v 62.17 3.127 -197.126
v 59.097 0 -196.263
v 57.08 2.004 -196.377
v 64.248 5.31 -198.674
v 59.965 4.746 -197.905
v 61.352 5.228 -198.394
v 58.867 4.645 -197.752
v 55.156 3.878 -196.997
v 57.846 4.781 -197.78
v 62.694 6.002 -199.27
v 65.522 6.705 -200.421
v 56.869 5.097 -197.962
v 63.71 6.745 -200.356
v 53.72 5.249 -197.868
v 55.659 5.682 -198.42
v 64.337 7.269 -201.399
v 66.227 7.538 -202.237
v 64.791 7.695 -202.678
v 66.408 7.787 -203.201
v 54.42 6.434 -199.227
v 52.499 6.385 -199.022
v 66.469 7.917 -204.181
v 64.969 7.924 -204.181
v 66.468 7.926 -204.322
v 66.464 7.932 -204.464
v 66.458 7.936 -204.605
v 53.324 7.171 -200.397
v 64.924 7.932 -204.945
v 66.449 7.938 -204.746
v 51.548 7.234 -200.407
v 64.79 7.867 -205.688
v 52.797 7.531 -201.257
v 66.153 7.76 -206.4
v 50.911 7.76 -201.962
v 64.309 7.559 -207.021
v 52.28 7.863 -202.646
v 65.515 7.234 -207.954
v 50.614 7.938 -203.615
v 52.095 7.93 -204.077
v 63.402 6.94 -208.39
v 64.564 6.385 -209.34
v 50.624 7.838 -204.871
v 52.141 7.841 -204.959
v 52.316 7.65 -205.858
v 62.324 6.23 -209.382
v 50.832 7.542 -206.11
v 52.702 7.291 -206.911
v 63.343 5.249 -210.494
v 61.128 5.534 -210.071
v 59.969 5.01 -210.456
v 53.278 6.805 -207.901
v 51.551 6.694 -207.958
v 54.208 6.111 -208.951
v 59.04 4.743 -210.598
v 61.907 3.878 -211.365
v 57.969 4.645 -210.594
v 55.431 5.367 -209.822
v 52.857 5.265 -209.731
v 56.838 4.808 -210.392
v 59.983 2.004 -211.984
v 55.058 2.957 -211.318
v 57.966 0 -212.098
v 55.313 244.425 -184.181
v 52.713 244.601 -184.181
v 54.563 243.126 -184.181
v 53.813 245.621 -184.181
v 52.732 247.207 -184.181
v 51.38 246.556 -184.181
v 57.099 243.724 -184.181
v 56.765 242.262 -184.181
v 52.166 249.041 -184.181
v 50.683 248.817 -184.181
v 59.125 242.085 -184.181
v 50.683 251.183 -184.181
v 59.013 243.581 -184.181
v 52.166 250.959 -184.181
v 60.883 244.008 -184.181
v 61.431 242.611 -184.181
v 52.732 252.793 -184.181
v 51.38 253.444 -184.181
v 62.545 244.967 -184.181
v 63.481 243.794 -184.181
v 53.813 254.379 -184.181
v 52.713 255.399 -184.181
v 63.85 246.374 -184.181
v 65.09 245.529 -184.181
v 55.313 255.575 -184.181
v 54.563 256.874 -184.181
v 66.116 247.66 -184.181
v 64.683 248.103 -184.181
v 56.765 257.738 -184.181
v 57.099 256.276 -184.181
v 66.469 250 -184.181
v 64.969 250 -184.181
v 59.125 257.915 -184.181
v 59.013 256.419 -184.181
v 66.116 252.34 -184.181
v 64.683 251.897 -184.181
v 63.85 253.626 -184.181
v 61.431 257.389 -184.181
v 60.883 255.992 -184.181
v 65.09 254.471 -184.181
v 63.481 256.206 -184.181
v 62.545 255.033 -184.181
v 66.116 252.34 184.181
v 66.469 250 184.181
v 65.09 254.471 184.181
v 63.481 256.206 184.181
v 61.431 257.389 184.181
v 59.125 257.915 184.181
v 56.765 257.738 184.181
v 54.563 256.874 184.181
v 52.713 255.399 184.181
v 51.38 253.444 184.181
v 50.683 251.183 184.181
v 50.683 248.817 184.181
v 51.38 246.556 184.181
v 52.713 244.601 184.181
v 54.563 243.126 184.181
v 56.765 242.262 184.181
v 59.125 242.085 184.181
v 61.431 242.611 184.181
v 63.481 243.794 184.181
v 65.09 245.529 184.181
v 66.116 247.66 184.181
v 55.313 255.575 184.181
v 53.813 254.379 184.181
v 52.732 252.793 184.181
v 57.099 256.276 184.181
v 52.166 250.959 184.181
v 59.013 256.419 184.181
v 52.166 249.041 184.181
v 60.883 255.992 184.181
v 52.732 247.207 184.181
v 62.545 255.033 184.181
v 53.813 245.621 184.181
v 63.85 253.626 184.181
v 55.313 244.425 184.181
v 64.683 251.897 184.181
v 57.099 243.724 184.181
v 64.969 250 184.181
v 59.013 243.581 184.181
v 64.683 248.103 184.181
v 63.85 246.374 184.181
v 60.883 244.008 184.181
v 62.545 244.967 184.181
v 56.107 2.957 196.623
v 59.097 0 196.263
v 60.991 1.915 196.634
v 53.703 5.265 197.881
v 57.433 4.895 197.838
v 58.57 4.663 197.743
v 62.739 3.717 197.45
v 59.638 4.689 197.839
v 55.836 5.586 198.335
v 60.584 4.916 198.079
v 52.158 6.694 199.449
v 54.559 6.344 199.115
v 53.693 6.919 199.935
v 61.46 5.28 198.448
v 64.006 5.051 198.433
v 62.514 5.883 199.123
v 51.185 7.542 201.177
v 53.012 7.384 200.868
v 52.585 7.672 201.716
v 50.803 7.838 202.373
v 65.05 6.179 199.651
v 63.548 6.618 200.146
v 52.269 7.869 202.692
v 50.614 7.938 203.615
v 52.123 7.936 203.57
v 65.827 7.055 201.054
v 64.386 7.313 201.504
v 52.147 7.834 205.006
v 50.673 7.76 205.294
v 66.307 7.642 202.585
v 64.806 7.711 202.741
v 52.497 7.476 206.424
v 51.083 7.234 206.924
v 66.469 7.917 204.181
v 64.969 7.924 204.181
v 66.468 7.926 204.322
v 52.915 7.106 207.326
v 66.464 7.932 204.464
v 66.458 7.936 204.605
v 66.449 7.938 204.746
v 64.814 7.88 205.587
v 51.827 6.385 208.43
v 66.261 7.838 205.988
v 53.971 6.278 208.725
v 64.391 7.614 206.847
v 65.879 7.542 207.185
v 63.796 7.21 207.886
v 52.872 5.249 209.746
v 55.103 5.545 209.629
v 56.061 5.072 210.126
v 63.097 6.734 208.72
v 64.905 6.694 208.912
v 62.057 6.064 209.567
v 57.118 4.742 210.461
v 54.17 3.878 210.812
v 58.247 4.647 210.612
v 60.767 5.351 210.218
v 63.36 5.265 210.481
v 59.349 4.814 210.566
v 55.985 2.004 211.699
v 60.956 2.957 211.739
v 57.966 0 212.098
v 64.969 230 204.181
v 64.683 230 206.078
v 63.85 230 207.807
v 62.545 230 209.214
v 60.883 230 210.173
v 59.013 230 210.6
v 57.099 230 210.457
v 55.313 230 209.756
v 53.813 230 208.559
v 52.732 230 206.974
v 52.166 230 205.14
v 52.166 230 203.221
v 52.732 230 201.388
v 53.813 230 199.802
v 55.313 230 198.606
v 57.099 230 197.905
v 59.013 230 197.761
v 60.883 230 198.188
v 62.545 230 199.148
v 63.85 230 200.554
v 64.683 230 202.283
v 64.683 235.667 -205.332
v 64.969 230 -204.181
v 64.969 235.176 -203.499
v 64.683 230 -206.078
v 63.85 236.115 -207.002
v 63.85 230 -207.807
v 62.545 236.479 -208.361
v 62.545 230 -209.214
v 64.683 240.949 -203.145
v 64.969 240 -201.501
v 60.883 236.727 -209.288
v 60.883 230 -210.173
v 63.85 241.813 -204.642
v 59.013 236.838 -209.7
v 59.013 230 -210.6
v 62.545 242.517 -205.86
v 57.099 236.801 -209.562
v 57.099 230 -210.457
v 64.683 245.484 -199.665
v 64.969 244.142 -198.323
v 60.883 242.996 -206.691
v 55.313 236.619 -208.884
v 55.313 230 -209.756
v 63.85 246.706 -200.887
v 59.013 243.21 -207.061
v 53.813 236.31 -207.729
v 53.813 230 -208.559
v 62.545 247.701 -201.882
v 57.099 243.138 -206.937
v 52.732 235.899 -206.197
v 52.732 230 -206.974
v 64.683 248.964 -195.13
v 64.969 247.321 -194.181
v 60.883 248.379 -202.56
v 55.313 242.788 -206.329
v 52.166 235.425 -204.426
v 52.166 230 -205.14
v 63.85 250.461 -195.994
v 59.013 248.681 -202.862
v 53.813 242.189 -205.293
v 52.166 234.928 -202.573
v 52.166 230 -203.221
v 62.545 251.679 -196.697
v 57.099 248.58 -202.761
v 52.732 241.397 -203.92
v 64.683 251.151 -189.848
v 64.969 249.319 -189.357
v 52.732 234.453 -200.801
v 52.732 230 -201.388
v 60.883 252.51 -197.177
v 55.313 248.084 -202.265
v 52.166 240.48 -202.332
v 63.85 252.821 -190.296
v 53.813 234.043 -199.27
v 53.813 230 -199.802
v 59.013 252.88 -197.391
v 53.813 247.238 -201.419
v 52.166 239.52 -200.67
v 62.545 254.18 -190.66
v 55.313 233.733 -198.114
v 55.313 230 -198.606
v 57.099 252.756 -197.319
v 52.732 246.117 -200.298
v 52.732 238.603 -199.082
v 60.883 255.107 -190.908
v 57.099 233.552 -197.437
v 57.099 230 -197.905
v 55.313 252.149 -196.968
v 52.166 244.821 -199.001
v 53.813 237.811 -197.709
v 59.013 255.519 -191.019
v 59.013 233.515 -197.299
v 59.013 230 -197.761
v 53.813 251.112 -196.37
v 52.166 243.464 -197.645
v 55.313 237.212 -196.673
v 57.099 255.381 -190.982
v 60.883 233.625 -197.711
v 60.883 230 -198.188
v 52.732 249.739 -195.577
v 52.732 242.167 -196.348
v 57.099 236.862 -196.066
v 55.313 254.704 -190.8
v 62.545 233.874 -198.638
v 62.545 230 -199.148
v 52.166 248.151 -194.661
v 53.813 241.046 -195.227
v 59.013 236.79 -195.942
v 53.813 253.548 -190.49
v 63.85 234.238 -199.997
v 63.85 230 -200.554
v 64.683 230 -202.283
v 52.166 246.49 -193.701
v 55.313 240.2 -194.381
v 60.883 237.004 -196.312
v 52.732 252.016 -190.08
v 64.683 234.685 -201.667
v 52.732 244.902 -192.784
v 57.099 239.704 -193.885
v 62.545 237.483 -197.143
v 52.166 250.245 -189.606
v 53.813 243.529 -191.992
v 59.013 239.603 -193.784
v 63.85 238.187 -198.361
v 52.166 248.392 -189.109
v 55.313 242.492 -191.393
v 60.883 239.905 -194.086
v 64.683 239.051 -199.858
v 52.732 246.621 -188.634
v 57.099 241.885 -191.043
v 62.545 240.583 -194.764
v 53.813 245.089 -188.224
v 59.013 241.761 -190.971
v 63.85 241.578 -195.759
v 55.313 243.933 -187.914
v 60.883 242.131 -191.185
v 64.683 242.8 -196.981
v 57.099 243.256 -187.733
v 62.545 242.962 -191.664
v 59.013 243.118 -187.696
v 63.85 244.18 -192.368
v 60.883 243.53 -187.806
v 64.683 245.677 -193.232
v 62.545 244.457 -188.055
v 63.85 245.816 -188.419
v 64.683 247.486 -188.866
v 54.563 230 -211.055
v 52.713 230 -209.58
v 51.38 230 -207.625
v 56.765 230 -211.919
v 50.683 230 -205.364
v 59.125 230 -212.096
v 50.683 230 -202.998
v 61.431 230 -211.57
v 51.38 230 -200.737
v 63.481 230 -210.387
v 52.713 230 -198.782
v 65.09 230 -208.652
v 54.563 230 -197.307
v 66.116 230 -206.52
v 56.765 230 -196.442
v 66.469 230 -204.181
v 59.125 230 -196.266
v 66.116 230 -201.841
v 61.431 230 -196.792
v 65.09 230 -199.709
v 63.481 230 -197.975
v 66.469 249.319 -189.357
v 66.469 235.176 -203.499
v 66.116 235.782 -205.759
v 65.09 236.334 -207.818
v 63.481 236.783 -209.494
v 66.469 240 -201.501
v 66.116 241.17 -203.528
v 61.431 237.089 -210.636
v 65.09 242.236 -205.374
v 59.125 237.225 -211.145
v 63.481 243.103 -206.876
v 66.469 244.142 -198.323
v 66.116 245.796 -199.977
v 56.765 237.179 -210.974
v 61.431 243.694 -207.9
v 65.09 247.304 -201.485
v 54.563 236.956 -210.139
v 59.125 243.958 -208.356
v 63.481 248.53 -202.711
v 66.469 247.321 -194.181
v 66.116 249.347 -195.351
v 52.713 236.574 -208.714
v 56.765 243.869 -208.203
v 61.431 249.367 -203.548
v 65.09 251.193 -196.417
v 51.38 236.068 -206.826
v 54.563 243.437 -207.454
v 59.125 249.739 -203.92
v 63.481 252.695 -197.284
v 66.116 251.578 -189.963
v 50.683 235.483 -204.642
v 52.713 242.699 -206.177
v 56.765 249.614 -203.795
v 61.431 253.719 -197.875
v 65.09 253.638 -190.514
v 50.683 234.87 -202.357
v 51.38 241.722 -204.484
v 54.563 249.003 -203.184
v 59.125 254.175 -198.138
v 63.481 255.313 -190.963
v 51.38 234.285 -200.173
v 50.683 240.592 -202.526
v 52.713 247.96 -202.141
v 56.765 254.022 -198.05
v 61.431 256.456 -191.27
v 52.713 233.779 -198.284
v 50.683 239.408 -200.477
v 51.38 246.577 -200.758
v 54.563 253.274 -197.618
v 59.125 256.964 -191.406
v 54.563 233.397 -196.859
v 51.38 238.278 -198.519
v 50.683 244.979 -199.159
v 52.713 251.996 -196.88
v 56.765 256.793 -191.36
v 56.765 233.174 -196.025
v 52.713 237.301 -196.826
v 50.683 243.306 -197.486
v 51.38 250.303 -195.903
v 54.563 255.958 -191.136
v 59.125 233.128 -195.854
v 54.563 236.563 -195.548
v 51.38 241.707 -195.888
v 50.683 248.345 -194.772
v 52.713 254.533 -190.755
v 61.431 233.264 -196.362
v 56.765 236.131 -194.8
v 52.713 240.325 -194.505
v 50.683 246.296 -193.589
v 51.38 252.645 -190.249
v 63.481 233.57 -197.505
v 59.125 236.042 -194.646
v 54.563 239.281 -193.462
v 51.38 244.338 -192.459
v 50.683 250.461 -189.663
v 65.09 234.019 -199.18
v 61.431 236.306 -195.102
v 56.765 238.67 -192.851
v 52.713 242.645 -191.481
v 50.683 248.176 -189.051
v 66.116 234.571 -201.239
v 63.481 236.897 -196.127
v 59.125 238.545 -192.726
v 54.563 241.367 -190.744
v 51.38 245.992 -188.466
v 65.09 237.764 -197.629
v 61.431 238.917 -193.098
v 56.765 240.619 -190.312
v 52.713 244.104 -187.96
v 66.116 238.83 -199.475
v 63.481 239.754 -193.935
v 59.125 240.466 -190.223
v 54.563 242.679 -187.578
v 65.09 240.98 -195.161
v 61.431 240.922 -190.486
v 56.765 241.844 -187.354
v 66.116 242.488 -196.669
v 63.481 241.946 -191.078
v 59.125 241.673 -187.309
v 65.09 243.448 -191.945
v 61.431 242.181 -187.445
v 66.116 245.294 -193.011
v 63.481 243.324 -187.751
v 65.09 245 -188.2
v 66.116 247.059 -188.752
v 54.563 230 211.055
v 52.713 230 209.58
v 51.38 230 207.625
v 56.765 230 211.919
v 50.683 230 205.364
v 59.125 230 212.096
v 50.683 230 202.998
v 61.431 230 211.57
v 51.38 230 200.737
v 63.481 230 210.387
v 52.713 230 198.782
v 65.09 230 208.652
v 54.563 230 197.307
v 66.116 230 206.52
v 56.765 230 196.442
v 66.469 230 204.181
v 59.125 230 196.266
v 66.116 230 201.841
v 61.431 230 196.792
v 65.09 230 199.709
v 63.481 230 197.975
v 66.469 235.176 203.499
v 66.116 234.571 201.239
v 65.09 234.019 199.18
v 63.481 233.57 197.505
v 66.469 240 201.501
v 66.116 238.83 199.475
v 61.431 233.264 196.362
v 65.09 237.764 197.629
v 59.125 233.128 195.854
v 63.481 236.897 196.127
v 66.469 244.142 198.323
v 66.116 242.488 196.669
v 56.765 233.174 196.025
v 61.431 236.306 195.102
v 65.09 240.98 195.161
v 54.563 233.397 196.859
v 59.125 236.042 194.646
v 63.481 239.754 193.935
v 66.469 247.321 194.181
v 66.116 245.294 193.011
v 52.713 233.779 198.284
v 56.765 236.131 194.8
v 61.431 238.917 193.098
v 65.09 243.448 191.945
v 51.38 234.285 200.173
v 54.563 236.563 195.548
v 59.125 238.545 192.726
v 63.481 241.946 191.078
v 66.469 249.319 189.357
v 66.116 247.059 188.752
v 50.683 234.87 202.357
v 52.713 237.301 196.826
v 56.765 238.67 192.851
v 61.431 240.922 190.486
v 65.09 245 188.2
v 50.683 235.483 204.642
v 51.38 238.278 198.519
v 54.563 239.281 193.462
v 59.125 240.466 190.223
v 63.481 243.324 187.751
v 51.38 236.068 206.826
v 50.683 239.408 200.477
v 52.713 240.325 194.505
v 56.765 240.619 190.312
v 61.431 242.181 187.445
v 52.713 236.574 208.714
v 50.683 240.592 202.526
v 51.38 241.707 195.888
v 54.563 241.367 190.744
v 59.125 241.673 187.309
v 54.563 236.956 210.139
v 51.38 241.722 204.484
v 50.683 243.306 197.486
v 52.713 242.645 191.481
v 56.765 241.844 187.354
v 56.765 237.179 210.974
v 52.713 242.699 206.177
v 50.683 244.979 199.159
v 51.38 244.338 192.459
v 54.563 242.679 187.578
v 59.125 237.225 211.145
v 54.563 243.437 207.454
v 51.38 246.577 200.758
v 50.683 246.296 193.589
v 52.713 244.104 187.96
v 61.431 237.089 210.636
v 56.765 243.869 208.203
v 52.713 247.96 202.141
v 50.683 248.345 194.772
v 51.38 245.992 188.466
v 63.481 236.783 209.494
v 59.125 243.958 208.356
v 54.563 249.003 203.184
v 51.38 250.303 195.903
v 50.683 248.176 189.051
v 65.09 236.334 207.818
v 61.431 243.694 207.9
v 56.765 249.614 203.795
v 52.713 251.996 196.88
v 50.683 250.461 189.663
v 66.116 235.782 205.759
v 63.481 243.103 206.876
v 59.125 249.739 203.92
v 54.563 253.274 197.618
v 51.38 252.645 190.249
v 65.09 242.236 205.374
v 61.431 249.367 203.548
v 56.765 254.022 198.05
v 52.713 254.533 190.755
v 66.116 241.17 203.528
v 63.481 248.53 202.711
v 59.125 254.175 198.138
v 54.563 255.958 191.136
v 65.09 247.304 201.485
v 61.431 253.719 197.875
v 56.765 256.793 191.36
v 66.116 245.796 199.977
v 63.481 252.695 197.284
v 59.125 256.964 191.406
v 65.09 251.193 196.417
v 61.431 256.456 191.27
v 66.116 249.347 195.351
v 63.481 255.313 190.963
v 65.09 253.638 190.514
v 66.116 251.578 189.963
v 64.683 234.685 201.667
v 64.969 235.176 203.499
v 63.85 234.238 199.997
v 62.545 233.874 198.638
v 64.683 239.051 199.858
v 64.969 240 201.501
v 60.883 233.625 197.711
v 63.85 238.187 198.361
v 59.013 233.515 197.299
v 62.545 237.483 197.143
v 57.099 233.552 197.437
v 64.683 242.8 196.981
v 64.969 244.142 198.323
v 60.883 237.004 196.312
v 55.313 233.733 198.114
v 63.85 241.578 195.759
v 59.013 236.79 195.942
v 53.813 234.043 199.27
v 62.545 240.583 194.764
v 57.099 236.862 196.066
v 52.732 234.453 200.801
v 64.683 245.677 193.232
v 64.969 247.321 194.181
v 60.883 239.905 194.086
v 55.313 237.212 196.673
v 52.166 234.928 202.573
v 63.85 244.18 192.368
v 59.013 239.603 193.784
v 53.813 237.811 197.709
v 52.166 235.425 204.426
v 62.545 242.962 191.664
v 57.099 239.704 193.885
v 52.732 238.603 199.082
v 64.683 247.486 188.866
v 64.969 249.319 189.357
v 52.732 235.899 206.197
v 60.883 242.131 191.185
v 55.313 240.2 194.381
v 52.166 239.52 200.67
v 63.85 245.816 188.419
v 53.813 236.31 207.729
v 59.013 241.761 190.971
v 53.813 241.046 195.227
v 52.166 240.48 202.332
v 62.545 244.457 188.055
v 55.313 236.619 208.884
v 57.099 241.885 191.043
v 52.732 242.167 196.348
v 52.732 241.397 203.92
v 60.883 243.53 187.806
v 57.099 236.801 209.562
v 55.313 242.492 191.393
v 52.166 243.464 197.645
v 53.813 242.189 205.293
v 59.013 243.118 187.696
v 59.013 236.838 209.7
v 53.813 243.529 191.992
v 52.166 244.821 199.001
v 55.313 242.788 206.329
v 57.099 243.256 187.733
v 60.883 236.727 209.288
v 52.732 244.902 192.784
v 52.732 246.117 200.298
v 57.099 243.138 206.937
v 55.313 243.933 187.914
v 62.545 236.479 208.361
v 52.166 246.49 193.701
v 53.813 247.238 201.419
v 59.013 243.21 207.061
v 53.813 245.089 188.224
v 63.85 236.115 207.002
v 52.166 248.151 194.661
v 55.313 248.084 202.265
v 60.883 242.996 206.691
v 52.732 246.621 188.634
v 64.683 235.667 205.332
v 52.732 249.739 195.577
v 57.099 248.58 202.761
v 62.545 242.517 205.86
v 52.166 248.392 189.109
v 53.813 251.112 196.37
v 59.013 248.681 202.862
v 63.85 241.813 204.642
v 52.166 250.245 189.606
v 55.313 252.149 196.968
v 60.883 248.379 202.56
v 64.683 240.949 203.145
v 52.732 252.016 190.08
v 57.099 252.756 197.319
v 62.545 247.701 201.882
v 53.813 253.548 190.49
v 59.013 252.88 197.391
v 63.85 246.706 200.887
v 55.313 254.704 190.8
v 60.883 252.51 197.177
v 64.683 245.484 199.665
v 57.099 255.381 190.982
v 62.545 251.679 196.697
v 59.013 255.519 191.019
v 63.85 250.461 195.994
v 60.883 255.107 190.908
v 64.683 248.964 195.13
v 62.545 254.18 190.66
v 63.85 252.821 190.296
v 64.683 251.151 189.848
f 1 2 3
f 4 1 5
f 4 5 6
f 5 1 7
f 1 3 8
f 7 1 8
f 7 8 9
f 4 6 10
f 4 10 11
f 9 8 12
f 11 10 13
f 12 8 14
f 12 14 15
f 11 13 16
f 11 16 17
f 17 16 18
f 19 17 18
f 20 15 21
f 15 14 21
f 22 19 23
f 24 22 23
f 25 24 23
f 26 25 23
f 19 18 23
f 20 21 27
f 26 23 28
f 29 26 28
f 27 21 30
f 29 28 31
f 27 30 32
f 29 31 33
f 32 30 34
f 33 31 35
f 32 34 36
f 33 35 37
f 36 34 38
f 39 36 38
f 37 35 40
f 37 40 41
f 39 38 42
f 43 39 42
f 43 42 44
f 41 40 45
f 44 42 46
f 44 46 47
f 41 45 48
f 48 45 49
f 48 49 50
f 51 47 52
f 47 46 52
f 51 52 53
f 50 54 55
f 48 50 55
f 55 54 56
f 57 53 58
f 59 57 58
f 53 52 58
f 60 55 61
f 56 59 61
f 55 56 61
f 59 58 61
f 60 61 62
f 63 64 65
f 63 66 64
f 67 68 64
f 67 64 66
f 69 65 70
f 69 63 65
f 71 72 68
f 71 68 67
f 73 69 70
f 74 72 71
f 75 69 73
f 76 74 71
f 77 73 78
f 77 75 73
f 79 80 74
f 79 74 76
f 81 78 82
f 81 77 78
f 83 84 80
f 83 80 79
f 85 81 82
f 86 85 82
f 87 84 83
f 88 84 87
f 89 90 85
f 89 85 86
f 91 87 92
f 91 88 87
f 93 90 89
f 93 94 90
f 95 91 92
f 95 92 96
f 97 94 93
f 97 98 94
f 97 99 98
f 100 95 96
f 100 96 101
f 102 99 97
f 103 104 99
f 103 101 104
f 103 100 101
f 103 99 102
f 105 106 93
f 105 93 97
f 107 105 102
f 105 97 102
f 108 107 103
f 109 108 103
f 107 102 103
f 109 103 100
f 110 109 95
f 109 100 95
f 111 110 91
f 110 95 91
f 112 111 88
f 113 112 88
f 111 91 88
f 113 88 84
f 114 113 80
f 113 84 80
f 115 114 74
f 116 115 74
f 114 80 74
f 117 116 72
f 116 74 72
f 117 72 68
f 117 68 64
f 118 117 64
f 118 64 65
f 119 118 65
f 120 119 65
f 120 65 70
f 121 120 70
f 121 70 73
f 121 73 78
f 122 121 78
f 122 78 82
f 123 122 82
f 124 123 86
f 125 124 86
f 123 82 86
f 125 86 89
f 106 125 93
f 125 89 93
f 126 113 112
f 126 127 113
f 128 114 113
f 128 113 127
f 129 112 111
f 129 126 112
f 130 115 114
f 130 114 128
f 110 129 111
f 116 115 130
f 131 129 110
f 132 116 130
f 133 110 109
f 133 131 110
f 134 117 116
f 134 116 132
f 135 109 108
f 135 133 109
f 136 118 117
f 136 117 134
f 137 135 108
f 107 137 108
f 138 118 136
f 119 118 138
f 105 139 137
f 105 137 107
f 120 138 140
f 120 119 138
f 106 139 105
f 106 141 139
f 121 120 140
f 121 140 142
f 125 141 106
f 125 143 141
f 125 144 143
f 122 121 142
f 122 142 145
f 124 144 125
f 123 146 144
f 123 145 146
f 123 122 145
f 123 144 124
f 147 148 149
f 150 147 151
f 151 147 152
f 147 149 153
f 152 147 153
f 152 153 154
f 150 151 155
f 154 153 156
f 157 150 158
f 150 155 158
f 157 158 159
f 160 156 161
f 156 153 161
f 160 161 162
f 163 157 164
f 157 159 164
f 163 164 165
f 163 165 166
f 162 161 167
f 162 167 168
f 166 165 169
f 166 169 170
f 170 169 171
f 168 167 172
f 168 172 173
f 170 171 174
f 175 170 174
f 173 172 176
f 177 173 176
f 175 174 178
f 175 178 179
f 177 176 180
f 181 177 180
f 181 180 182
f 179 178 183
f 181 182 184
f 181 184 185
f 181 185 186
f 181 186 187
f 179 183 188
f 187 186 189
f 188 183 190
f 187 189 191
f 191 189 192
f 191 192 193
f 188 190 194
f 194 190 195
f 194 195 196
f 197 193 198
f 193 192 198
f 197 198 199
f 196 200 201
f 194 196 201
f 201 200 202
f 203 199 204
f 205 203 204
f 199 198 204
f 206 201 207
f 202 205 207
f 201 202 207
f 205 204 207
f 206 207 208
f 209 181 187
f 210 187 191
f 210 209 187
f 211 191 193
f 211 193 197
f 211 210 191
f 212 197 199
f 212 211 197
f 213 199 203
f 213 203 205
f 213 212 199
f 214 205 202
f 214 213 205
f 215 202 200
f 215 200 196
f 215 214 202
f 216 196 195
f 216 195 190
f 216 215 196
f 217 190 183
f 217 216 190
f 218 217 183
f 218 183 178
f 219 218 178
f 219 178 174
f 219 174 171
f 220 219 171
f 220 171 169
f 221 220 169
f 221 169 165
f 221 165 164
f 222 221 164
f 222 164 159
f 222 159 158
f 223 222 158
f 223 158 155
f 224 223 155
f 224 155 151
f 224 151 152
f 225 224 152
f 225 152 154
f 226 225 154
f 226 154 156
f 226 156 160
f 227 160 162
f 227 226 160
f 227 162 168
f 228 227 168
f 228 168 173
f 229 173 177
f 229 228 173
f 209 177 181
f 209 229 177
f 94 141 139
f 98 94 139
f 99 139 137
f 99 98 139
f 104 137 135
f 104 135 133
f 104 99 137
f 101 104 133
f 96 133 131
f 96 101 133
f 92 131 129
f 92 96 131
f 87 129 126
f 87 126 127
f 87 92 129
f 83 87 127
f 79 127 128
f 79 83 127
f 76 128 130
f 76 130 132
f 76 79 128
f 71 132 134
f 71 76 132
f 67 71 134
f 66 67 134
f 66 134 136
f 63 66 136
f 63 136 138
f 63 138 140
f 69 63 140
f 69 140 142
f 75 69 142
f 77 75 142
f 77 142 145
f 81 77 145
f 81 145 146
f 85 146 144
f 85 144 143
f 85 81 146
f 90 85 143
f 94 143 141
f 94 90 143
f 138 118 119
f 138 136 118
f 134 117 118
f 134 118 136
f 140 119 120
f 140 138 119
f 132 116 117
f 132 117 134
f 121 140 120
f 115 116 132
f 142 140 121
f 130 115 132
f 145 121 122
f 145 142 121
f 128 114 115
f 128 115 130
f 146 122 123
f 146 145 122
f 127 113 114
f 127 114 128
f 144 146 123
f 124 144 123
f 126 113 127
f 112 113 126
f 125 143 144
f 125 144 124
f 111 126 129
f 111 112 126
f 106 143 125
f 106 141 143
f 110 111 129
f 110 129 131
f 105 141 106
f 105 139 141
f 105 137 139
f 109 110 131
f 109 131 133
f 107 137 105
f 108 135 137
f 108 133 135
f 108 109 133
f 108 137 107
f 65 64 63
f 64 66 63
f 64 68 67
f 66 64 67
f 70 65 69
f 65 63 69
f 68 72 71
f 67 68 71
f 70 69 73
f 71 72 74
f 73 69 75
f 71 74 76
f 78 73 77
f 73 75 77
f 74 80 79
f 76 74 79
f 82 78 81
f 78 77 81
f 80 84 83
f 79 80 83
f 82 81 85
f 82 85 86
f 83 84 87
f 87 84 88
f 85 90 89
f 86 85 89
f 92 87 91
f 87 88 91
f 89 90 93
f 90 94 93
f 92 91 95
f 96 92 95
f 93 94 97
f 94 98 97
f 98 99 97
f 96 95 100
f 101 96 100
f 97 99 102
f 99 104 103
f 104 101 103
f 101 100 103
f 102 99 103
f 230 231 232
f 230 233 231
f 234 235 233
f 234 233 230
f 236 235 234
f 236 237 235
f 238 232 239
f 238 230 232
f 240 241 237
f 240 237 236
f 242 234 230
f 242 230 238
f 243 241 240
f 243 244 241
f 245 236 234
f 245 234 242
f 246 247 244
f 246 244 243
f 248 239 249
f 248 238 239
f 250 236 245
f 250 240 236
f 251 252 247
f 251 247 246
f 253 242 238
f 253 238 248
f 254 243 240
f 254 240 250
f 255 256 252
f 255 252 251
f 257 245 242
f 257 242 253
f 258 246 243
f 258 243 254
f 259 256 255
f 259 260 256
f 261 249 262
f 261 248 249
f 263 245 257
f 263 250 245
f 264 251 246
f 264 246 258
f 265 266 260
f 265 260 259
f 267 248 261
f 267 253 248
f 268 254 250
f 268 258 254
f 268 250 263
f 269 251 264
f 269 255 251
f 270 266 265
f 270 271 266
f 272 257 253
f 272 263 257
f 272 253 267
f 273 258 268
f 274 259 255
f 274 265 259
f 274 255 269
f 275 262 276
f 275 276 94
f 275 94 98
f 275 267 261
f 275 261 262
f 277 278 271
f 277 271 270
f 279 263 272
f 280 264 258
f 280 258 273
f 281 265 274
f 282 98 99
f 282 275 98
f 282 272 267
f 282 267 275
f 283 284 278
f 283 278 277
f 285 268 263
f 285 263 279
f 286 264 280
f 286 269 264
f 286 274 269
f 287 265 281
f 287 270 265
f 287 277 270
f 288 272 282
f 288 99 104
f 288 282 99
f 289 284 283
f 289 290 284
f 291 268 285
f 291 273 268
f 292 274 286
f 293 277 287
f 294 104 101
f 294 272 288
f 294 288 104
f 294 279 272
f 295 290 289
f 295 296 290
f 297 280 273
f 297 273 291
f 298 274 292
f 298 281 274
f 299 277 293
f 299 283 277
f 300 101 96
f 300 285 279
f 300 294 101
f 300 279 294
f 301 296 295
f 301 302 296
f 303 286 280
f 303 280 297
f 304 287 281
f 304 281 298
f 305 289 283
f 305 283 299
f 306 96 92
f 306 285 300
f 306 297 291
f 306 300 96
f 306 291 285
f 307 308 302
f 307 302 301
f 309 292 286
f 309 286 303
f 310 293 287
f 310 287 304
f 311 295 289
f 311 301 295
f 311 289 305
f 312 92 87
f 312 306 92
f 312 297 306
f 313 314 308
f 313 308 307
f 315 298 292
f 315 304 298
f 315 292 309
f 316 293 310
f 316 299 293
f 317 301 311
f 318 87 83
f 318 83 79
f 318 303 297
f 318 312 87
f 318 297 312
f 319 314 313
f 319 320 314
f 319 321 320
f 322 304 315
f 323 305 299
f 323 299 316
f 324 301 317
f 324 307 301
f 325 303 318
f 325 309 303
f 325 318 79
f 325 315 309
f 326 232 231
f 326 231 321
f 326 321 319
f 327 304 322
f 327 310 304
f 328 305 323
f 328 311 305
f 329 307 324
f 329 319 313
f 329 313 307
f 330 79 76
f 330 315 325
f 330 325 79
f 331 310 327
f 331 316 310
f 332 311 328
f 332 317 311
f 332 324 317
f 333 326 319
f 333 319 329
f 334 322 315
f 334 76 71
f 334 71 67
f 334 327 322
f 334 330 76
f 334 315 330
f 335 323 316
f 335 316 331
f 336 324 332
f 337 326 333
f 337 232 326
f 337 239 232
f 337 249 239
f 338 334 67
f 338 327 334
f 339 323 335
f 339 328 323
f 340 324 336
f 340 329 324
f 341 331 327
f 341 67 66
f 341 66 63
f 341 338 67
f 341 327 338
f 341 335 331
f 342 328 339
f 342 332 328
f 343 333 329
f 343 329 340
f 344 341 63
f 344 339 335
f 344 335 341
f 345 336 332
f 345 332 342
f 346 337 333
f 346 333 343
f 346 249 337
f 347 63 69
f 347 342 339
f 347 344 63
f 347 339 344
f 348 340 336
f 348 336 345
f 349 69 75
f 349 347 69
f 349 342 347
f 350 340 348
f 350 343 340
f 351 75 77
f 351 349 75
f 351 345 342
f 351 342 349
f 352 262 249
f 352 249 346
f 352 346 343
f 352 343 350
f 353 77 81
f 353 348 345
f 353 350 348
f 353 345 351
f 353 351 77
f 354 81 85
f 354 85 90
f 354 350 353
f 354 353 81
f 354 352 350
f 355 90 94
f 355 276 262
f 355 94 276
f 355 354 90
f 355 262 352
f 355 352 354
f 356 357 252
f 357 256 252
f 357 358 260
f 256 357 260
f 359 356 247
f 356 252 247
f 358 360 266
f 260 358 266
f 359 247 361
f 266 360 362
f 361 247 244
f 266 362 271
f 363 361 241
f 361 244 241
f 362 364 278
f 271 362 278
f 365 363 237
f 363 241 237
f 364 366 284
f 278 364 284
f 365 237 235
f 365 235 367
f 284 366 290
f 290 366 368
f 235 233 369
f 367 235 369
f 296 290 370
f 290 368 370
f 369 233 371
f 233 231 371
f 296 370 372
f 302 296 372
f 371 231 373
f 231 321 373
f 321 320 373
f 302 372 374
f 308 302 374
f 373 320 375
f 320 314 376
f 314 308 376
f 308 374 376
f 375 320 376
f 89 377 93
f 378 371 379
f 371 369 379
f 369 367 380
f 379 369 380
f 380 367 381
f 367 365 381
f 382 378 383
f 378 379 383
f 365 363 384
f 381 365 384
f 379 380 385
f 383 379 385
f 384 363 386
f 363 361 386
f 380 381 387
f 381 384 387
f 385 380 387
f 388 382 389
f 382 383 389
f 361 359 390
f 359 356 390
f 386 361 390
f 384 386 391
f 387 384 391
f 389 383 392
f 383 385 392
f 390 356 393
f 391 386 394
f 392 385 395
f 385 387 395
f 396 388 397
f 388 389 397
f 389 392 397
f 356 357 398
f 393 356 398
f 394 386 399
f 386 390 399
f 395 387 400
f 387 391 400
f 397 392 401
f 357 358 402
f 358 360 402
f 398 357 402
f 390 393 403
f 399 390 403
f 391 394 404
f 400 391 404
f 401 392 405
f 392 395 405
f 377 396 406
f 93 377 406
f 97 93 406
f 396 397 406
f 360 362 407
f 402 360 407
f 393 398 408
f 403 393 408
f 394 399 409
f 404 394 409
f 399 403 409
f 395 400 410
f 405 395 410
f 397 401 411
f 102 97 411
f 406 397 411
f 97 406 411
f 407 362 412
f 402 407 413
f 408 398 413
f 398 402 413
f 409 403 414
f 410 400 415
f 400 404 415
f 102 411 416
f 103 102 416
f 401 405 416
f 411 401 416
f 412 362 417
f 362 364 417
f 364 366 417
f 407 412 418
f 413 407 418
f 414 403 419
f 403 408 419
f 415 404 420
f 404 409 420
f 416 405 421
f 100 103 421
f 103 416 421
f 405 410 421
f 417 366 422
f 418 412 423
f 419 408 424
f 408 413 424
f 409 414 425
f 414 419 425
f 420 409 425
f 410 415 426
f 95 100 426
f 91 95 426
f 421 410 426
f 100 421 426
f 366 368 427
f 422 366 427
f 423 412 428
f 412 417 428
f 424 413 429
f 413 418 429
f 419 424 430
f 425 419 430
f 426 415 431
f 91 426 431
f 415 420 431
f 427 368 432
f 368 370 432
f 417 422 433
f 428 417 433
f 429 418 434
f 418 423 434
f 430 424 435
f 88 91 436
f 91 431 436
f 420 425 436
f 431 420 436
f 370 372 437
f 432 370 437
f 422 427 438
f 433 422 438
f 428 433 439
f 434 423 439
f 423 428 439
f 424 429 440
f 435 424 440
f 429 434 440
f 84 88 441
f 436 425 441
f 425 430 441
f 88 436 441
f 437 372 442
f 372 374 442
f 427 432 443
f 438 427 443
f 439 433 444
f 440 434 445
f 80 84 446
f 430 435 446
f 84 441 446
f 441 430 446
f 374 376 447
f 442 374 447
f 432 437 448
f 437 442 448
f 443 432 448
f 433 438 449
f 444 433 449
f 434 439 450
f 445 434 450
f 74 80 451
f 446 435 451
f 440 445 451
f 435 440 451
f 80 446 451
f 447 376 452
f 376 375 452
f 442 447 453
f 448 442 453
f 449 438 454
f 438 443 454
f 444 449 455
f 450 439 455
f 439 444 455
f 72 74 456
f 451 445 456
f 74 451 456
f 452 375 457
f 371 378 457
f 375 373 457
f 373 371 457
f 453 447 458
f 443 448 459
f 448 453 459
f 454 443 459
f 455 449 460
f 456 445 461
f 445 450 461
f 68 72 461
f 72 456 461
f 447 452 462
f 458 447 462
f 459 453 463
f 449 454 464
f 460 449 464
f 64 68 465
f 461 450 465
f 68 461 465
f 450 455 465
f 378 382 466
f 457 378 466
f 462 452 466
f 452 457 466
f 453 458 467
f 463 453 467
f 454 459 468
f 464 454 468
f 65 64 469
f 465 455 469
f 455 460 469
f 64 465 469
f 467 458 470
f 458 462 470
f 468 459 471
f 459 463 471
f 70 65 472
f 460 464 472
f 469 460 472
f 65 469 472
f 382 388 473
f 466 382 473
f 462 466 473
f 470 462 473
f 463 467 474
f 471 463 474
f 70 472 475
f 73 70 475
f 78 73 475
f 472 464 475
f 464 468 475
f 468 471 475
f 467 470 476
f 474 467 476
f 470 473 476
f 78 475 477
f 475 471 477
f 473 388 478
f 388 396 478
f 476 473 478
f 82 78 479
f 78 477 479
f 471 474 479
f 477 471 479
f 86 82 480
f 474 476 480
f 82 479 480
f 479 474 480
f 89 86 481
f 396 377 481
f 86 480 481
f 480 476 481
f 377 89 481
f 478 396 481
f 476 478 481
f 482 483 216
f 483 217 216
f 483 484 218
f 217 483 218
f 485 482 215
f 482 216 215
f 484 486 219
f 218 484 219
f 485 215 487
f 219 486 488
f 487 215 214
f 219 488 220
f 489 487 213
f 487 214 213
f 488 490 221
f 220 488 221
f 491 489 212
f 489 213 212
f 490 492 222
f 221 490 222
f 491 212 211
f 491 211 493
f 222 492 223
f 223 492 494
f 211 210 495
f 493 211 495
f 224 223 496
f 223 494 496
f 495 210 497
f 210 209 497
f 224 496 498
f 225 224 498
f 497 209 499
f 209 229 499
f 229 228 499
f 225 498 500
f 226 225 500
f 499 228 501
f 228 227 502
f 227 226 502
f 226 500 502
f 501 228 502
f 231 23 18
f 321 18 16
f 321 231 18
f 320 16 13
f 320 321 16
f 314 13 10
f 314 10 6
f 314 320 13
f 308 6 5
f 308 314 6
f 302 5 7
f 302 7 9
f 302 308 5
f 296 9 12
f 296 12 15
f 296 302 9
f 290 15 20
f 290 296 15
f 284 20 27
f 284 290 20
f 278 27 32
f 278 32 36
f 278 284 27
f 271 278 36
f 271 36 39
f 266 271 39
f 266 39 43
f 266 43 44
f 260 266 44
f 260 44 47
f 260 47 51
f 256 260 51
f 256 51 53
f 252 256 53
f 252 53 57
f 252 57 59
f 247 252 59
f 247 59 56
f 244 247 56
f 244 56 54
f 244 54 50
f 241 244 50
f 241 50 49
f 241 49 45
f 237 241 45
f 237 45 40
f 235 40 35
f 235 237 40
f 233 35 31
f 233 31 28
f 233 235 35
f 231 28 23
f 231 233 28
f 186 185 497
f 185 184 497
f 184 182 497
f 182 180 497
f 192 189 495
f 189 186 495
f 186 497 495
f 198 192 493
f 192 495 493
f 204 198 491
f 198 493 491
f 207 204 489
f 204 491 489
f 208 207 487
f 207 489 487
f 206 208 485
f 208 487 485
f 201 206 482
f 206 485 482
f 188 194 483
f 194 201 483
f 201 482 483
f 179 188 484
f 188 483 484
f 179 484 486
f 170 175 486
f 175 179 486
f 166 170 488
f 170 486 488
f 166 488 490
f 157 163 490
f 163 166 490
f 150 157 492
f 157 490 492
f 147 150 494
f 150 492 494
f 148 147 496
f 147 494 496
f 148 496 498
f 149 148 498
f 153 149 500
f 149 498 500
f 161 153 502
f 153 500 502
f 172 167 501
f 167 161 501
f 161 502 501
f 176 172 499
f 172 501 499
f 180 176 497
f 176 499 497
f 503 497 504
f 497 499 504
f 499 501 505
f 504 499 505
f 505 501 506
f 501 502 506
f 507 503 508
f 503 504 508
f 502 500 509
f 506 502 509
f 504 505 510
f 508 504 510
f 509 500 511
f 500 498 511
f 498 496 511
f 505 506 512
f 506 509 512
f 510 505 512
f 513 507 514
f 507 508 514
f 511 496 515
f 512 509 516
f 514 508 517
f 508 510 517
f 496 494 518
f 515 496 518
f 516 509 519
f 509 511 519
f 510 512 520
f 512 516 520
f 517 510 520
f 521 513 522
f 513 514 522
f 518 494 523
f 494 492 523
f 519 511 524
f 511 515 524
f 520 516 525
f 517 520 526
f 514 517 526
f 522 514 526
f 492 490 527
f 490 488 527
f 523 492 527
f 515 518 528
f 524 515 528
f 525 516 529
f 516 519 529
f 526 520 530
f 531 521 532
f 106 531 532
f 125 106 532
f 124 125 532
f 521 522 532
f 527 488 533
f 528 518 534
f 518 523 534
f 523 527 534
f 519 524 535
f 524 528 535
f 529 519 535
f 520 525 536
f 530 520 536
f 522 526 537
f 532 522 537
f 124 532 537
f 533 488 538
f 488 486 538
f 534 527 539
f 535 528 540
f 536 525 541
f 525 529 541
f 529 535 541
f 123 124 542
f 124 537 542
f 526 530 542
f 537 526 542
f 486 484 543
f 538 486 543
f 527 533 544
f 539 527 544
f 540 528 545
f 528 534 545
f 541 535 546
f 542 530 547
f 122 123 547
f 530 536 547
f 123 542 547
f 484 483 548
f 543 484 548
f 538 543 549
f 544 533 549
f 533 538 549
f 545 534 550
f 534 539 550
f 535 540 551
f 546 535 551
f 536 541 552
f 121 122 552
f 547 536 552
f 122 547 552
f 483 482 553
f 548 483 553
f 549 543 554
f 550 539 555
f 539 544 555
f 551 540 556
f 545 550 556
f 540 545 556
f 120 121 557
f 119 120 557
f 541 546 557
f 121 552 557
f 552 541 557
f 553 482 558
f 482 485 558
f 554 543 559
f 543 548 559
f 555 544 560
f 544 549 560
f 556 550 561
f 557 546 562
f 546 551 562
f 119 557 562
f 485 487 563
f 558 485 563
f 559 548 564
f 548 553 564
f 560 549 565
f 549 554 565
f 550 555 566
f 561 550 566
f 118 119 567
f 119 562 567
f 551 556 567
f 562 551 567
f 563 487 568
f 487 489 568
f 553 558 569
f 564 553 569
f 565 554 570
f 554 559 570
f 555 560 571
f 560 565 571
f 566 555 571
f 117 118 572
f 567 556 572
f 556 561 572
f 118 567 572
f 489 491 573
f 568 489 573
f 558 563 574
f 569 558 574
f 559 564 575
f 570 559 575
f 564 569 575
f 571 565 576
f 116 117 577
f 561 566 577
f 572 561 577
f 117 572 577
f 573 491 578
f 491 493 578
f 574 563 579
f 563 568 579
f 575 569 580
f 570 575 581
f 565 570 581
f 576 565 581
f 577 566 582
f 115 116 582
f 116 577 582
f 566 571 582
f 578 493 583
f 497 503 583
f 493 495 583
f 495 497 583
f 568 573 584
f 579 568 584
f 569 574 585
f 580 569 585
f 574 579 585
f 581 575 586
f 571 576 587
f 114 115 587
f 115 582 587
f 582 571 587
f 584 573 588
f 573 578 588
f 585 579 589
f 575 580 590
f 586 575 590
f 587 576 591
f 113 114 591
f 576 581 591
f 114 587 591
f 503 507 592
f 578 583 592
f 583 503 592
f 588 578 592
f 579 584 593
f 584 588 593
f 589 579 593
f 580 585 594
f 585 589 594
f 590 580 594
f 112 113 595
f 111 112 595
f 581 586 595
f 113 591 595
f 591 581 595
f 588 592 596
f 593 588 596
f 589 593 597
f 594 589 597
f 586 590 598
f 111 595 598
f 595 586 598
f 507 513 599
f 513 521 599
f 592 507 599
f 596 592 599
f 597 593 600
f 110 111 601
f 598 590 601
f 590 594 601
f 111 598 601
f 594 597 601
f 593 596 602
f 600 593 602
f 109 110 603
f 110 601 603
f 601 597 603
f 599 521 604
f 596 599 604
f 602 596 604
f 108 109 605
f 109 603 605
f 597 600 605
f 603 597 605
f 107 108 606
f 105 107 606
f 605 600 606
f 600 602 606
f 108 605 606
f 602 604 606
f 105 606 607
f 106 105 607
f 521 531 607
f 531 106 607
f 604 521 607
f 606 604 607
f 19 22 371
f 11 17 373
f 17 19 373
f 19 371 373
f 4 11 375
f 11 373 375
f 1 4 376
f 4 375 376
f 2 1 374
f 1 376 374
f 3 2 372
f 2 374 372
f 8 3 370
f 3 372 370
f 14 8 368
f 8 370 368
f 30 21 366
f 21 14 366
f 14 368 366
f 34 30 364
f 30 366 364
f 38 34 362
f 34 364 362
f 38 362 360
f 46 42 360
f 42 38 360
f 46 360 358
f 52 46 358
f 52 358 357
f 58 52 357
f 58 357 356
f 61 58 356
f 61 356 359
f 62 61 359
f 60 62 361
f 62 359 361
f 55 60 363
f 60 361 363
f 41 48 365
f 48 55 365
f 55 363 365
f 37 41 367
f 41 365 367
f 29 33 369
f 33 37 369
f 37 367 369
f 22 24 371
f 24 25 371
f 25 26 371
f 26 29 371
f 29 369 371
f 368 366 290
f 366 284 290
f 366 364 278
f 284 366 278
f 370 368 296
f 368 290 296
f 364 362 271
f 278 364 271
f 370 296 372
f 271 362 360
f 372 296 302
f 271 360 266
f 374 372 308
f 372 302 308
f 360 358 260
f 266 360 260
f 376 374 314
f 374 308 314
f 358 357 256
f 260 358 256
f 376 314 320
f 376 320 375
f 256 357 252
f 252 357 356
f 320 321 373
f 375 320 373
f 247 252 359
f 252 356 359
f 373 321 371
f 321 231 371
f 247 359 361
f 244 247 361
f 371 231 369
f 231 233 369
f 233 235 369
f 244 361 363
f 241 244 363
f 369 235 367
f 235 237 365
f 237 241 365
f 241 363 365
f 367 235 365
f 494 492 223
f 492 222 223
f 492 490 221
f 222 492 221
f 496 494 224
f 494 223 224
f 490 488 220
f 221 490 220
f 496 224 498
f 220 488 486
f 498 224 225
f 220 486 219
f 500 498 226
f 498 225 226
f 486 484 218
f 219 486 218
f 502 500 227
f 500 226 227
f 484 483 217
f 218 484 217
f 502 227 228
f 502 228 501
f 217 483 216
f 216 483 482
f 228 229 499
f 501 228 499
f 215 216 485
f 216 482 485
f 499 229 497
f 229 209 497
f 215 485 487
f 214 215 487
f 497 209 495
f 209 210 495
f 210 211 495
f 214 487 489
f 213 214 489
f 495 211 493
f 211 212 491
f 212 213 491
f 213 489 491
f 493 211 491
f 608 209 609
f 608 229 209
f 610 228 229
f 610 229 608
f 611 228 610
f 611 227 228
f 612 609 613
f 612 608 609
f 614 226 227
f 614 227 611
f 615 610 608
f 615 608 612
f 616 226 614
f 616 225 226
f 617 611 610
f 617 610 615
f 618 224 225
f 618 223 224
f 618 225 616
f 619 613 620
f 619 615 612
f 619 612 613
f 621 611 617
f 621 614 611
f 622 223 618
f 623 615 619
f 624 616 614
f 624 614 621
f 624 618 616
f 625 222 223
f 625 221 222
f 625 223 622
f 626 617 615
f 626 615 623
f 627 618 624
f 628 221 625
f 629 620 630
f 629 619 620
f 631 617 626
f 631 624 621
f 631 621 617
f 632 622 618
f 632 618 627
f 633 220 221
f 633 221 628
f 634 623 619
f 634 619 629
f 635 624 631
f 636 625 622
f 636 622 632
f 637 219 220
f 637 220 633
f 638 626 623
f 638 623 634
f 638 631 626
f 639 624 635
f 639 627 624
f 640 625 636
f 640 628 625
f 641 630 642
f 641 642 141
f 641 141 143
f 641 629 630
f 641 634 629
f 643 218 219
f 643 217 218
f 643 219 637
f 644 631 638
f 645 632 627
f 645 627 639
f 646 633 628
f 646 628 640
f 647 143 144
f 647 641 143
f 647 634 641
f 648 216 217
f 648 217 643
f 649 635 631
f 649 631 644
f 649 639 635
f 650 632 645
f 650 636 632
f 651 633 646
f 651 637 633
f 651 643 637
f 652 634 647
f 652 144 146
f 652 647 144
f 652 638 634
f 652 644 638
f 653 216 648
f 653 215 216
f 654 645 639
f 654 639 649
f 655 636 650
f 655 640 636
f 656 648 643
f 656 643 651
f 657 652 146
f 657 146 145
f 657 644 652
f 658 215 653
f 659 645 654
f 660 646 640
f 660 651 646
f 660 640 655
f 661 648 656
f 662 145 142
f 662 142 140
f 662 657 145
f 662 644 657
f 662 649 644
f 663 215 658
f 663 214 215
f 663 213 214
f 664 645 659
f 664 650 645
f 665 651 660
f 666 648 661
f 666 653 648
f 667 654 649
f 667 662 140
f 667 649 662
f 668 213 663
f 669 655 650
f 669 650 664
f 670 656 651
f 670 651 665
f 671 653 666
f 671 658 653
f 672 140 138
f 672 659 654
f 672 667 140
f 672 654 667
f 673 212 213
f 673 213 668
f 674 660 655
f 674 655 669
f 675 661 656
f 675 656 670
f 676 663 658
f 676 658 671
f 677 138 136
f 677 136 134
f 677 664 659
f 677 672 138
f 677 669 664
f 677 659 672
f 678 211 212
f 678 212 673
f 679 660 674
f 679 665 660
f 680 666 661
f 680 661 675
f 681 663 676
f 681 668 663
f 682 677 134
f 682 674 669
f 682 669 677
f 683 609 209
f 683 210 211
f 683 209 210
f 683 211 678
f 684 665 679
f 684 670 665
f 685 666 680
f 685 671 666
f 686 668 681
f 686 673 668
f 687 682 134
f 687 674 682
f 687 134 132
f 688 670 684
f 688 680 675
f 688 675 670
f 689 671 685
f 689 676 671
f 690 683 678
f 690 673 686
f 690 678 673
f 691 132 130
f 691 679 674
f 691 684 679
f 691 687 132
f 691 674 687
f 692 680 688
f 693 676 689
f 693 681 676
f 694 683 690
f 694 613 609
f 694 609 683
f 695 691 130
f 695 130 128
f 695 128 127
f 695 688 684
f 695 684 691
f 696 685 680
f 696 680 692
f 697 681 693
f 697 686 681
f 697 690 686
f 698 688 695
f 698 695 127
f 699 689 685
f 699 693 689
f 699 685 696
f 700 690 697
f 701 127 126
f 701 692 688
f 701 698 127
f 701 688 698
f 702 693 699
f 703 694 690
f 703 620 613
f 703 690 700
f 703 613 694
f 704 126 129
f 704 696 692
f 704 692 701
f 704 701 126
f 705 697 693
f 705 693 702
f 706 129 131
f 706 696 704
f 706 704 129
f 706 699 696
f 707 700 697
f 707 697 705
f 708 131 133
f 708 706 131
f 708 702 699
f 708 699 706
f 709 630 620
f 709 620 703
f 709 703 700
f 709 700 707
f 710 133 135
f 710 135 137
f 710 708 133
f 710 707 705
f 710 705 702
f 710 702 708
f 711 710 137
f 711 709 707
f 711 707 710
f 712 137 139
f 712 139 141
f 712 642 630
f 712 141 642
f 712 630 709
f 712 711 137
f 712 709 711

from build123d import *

# Parameters (mm, degrees)
SKETCH1_ON_SEGMENT_1_R               = 7.9375
SKETCH1_ON_SEGMENT_1_R_2             = 6.4375
PIPE_CONFIGURED_21_3_X_2_3_1_DEPTH   = 230
SKETCH1_ON_SEGMENT_2_R               = 7.9375
SKETCH1_ON_SEGMENT_2_R_2             = 6.4375
PIPE_CONFIGURED_21_3_X_2_3_1_2_ANGLE = 90
SKETCH1_ON_SEGMENT_3_R               = 7.9375
SKETCH1_ON_SEGMENT_3_R_2             = 6.4375
PIPE_CONFIGURED_21_3_X_2_3_1_3_DEPTH = 368.361654036
SKETCH1_ON_SEGMENT_4_R               = 7.9375
SKETCH1_ON_SEGMENT_4_R_2             = 6.4375
PIPE_CONFIGURED_21_3_X_2_3_1_4_ANGLE = 90
SKETCH1_R                            = 7.9375
SKETCH1_R_2                          = 6.4375
PIPE_CONFIGURED_21_3_X_2_3_1_5_DEPTH = 230
ESBO_O6_R                            = 7.9375


with BuildPart() as part:
    # Sketch1 on segment 1 (carried to segment 1) → Pipe - configured 21.3 X 2.3(1) (new body)
    with BuildSketch(Plane(origin=(58.531578249, 230, -204.180827018), x_dir=(1, 0, 0), z_dir=(0, -1, 0))):
        Circle(SKETCH1_ON_SEGMENT_1_R)
        Circle(SKETCH1_ON_SEGMENT_1_R_2, mode=Mode.SUBTRACT)
    extrude(amount=PIPE_CONFIGURED_21_3_X_2_3_1_DEPTH)


with BuildPart() as body_2:
    # Sketch1 on segment 2 (carried to the start of arc 2) → Pipe - configured 21.3 X 2.3_1 2 (revolve)
    with BuildSketch(Plane(origin=(58.531578249, 230, -204.180827018), x_dir=(1, 0, 0), z_dir=(0, 1, 0))):
        Circle(SKETCH1_ON_SEGMENT_2_R)
        Circle(SKETCH1_ON_SEGMENT_2_R_2, mode=Mode.SUBTRACT)
    revolve(axis=Axis((58.531578249, 230, -184.180827018), (1, 0, 0)), revolution_arc=PIPE_CONFIGURED_21_3_X_2_3_1_2_ANGLE)


with BuildPart() as body_3:
    # Sketch1 on segment 3 (carried to segment 3) → Pipe - configured 21.3 X 2.3_1 3 (new body)
    with BuildSketch(Plane(origin=(58.531578249, 250, -184.180827018), x_dir=(1, 0, 0), z_dir=(0, 0, 1))):
        Circle(SKETCH1_ON_SEGMENT_3_R)
        Circle(SKETCH1_ON_SEGMENT_3_R_2, mode=Mode.SUBTRACT)
    extrude(amount=PIPE_CONFIGURED_21_3_X_2_3_1_3_DEPTH)


with BuildPart() as body_4:
    # Sketch1 on segment 4 (carried to the start of arc 4) → Pipe - configured 21.3 X 2.3_1 4 (revolve)
    with BuildSketch(Plane(origin=(58.531578249, 230, 204.180827018), x_dir=(1, 0, 0), z_dir=(0, 1, 0))):
        Circle(SKETCH1_ON_SEGMENT_4_R)
        Circle(SKETCH1_ON_SEGMENT_4_R_2, mode=Mode.SUBTRACT)
    revolve(axis=Axis((58.531578249, 230, 184.180827018), (-1, 0, 0)), revolution_arc=PIPE_CONFIGURED_21_3_X_2_3_1_4_ANGLE)


with BuildPart() as body_5:
    # Sketch1 → Pipe - configured 21.3 X 2.3_1 5 (new body)
    with BuildSketch(Plane(origin=(58.531578249, 230, 204.180827018), x_dir=(1, 0, 0), z_dir=(0, -1, 0))):
        Circle(SKETCH1_R)
        Circle(SKETCH1_R_2, mode=Mode.SUBTRACT)
    extrude(amount=PIPE_CONFIGURED_21_3_X_2_3_1_5_DEPTH)


with BuildPart() as varredura_de_corte1_tool:
    # Varredura de corte1: sweep along a path in Esboço1
    with BuildLine(Plane(origin=(0, 0, 0), x_dir=(1, 0, 0), z_dir=(0, 1, 0))) as varredura_de_corte1_path:
        Line((910, 265), (37.150118, 202.653579857))
        ThreePointArc((37.150118, 202.653579857), (10.725477972, 190.013301495), (0, 162.755231864))
        Line((0, 162.755231864), (0, -162.755231864))
        ThreePointArc((0, -162.755231864), (10.725477972, -190.013301495), (37.150118, -202.653579857))
        Line((37.150118, -202.653579857), (910, -265))
    # Esboço6 → Varredura de corte1 (sweep)
    with BuildSketch(Plane.XY):
        Circle(ESBO_O6_R)
    sweep(path=varredura_de_corte1_path.line)


with BuildPart() as part_1:
    add(part.part)

    # Varredura de corte1: cut by varredura_de_corte1_tool
    add(varredura_de_corte1_tool.part, mode=Mode.SUBTRACT)


with BuildPart() as body_5_1:
    add(body_5.part)

    # Varredura de corte1: cut by varredura_de_corte1_tool
    add(varredura_de_corte1_tool.part, mode=Mode.SUBTRACT)


solid = Compound([body_2.part, body_3.part, body_4.part, part_1.part, body_5_1.part])
